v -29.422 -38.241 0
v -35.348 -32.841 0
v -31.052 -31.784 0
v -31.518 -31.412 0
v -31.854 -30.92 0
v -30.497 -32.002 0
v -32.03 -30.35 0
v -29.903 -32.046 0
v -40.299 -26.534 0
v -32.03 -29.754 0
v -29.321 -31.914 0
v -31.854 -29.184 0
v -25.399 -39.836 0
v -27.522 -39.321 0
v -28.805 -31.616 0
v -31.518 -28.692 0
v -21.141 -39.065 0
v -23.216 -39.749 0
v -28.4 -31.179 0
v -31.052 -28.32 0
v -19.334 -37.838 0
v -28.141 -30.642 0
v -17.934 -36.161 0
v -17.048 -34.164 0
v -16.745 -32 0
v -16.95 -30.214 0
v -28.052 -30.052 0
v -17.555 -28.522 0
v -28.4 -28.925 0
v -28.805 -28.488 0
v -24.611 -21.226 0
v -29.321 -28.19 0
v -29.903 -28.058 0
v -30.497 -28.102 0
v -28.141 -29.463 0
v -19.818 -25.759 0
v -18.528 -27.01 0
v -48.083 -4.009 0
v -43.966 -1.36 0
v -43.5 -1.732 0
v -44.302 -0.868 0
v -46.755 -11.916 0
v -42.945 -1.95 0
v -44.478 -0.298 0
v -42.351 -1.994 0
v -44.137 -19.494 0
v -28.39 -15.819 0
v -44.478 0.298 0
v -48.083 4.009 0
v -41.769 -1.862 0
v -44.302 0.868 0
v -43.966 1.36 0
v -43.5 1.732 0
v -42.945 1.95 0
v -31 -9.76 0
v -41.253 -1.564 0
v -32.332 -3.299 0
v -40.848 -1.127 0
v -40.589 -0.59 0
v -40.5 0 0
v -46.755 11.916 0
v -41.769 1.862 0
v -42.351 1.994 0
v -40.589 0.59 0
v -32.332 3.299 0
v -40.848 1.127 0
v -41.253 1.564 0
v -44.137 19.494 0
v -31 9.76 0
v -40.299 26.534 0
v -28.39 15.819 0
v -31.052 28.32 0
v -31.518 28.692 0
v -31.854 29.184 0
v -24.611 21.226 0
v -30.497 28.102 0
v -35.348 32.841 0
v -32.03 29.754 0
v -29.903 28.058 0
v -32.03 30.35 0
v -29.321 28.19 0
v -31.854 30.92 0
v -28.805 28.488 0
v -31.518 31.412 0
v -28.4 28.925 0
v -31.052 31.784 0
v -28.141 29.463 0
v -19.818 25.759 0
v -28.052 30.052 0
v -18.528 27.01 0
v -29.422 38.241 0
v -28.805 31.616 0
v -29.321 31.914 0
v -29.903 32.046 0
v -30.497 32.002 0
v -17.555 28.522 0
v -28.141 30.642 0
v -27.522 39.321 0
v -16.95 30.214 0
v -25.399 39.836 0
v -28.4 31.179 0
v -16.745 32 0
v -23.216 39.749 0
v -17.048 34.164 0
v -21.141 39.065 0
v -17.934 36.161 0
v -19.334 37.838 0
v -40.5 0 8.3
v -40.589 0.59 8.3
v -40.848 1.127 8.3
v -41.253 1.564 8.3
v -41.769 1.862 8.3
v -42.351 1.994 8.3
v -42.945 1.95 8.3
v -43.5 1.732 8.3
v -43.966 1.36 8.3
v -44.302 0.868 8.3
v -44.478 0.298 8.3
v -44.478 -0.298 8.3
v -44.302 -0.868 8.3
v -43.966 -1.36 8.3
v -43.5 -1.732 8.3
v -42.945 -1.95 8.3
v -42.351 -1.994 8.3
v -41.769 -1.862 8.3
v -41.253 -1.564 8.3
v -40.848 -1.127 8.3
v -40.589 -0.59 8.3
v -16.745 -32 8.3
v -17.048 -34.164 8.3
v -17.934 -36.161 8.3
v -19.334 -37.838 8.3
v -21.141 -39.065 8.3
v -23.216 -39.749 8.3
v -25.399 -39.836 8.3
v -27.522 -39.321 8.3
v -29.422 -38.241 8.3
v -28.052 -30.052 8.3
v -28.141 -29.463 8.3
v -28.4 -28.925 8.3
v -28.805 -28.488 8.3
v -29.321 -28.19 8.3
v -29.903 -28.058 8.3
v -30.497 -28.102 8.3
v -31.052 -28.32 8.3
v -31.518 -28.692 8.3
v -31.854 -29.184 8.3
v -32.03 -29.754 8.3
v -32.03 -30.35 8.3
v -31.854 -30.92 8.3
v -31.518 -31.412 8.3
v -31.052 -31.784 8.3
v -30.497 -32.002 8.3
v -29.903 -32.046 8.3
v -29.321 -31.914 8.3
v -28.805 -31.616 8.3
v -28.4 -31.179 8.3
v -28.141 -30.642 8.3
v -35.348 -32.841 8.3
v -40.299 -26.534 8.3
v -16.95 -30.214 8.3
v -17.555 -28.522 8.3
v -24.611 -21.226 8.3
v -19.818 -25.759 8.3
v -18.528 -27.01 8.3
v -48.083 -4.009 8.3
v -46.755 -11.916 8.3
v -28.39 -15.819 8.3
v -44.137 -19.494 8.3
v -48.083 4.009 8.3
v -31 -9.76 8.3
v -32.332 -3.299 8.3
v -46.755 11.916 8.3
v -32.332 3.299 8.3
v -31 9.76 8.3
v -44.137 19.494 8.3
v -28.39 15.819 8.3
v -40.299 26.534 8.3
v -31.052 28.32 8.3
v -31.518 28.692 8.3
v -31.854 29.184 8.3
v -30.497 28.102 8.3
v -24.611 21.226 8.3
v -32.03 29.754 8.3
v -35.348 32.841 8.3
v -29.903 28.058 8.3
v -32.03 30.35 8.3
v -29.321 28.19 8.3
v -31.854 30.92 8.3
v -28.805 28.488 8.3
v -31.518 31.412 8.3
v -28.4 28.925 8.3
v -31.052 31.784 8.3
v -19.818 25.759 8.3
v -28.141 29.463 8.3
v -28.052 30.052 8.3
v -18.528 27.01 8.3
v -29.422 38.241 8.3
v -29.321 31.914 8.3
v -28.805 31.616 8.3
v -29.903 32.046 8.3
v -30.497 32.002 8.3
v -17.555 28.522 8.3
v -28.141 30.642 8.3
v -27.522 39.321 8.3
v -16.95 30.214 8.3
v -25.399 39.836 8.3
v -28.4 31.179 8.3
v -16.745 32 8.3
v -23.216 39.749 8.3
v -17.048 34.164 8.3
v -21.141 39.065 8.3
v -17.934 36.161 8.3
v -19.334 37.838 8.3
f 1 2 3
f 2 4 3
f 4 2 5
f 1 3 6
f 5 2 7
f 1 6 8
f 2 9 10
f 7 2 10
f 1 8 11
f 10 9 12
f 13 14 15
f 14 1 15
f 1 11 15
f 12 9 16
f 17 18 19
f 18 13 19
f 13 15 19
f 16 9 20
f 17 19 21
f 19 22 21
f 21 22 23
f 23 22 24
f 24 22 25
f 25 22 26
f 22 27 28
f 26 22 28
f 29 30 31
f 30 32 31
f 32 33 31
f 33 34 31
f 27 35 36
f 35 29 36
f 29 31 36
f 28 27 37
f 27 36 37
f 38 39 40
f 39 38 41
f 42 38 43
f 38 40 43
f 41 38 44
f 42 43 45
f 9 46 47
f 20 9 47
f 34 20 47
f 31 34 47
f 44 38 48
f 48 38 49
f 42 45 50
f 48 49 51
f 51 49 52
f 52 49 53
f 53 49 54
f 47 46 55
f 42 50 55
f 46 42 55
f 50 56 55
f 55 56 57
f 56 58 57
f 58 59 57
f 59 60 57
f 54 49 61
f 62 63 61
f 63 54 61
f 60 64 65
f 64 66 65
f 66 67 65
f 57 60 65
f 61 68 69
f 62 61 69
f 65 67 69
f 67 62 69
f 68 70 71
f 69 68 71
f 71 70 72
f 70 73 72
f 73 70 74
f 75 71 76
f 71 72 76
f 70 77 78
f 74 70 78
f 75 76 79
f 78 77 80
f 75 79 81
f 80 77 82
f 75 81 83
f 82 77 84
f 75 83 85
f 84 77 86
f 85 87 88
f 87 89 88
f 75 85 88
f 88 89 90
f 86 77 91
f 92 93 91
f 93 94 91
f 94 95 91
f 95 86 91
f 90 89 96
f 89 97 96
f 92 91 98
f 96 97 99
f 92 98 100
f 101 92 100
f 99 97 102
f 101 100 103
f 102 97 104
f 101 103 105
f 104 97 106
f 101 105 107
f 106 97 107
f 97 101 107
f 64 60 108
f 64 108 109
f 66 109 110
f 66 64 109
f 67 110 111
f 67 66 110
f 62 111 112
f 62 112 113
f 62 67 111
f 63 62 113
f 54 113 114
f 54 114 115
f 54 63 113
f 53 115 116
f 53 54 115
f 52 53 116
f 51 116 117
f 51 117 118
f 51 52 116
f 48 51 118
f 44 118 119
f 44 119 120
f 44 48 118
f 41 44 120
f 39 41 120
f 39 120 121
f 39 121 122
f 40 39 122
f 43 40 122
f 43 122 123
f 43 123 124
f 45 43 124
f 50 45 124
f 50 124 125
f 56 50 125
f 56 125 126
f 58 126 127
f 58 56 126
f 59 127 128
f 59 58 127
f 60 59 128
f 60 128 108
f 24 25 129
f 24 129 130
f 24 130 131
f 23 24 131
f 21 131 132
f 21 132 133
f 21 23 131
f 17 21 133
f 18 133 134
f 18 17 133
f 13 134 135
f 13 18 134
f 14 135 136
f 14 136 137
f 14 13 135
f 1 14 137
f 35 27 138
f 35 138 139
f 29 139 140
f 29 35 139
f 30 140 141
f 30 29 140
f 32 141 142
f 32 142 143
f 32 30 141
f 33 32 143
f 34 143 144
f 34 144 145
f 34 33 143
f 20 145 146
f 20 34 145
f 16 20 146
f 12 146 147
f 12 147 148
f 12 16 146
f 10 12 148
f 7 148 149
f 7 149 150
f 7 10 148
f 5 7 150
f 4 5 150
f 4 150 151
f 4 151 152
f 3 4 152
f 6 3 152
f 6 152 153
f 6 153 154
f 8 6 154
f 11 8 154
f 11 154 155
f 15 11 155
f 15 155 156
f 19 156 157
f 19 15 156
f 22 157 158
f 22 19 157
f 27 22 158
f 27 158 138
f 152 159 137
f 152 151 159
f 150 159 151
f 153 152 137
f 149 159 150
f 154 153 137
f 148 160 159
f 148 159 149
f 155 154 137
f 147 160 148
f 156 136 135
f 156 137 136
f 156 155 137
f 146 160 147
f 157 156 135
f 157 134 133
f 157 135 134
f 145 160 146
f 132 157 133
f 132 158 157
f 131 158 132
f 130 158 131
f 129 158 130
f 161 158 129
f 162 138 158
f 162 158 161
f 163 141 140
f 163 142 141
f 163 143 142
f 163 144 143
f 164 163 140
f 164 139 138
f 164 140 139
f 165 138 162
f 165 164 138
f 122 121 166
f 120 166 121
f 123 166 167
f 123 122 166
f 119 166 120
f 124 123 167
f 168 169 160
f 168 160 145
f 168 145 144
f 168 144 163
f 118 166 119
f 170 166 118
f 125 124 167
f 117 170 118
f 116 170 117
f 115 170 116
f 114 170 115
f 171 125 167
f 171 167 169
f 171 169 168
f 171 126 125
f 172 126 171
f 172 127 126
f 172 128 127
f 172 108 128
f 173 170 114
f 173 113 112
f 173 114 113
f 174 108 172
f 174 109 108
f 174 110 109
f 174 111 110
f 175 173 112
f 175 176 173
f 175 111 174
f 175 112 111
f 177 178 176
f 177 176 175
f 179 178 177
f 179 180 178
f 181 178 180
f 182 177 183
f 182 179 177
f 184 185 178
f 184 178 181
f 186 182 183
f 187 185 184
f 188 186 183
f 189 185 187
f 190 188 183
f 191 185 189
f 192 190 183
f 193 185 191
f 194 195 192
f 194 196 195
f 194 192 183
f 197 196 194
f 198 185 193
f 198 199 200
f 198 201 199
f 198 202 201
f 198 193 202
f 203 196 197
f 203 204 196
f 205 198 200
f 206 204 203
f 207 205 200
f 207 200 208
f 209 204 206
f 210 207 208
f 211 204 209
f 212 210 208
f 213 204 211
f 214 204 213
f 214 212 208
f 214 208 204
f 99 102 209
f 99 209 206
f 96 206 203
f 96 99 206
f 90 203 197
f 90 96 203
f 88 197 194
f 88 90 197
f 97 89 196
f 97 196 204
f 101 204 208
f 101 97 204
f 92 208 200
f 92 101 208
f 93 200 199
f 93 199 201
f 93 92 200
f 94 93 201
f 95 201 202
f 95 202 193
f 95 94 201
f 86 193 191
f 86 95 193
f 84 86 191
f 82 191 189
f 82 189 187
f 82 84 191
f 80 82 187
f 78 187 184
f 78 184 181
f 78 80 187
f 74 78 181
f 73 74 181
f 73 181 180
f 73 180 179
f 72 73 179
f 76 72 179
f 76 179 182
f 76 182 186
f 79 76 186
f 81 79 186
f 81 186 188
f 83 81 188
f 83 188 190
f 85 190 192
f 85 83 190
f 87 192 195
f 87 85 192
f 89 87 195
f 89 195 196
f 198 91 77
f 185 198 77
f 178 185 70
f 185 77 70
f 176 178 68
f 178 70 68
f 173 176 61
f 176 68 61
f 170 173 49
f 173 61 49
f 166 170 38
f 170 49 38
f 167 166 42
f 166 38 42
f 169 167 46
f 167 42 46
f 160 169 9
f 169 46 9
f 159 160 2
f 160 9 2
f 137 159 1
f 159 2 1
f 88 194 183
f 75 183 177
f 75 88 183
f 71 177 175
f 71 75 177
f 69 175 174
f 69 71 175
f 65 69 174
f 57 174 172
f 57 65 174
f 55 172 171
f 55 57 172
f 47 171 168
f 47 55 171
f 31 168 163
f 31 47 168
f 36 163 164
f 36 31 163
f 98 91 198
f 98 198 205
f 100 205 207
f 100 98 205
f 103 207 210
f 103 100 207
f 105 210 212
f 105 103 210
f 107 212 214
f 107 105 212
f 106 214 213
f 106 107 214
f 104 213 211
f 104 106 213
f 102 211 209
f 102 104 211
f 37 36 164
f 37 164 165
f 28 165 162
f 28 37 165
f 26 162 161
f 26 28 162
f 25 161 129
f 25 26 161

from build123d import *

# Parameters (mm, degrees)
SKETCH_1_R          = 48.25
SKETCH_1_R_2        = 32.5
SKETCH_1_R_3        = 2
EXTRUDE_1_DEPTH     = 8.3
CUT_EXTRUDE_START   = -46
SKETCH_2_R          = 2
CUT_EXTRUDE_1_DEPTH = 46


with BuildPart() as part:
    # 草图1 → 凸台-拉伸1 (new body)
    with BuildSketch(Plane.XY):
        Circle(SKETCH_1_R)
        Circle(SKETCH_1_R_2, mode=Mode.SUBTRACT)
        with Locations((0, 42.5)):
            Circle(SKETCH_1_R_3, mode=Mode.SUBTRACT)
        with Locations((30.0520382, 30.0520382)):
            Circle(SKETCH_1_R_3, mode=Mode.SUBTRACT)
        with Locations((42.5, 0)):
            Circle(SKETCH_1_R_3, mode=Mode.SUBTRACT)
        with Locations((30.0520382, -30.0520382)):
            Circle(SKETCH_1_R_3, mode=Mode.SUBTRACT)
        with Locations((0, -42.5)):
            Circle(SKETCH_1_R_3, mode=Mode.SUBTRACT)
        with Locations((-30.0520382, -30.0520382)):
            Circle(SKETCH_1_R_3, mode=Mode.SUBTRACT)
        with Locations((-42.5, 0)):
            Circle(SKETCH_1_R_3, mode=Mode.SUBTRACT)
        with Locations((-30.0520382, 30.0520382)):
            Circle(SKETCH_1_R_3, mode=Mode.SUBTRACT)
    extrude(amount=EXTRUDE_1_DEPTH)

    # 草图2 → 切除-拉伸1 (cut)
    # profile 1 of 2: a face of its own
    with BuildSketch(Plane.XY.offset(8.3).offset(CUT_EXTRUDE_START)):
        with BuildLine():
            ThreePointArc((40.5, 0), (42.5, 2), (44.5, 0))
            Line((44.5, 0), (48.25, 0))
            ThreePointArc((48.25, 0), (21.312594161, 43.287825426), (-29.421951508, 38.241486235))
            ThreePointArc((-29.421951508, 38.241486235), (-21.141442838, 39.065111353), (-16.744923335, 32))
            ThreePointArc((-16.744923335, 32), (-17.554811907, 28.521519654), (-19.817894894, 25.75851397))
            ThreePointArc((-19.817894894, 25.75851397), (14.355633318, 29.157602646), (32.5, 0))
            Line((32.5, 0), (40.5, 0))
        make_face()
        with Locations((0, 42.5)):
            Circle(SKETCH_2_R, mode=Mode.SUBTRACT)
        with Locations((30.0520382, 30.0520382)):
            Circle(SKETCH_2_R, mode=Mode.SUBTRACT)
    # profile 2 of 2: a face of its own
    with BuildSketch(Plane.XY.offset(8.3).offset(CUT_EXTRUDE_START)):
        with BuildLine():
            Line((48.25, 0), (44.5, 0))
            ThreePointArc((44.5, 0), (42.5, -2), (40.5, 0))
            Line((40.5, 0), (32.5, 0))
            ThreePointArc((32.5, 0), (14.355633349, -29.15760263), (-19.81789484, -25.758514012))
            ThreePointArc((-19.81789484, -25.758514012), (-17.554811892, -28.521519685), (-16.744923335, -32))
            ThreePointArc((-16.744923335, -32), (-21.14144309, -39.065111477), (-29.421951953, -38.241485892))
            ThreePointArc((-29.421951953, -38.241485892), (21.312593909, -43.28782555), (48.25, 0))
        make_face()
        with Locations((0, -42.5)):
            Circle(SKETCH_2_R, mode=Mode.SUBTRACT)
        with Locations((30.0520382, -30.0520382)):
            Circle(SKETCH_2_R, mode=Mode.SUBTRACT)
    extrude(amount=CUT_EXTRUDE_1_DEPTH, mode=Mode.SUBTRACT)


solid = part.part
